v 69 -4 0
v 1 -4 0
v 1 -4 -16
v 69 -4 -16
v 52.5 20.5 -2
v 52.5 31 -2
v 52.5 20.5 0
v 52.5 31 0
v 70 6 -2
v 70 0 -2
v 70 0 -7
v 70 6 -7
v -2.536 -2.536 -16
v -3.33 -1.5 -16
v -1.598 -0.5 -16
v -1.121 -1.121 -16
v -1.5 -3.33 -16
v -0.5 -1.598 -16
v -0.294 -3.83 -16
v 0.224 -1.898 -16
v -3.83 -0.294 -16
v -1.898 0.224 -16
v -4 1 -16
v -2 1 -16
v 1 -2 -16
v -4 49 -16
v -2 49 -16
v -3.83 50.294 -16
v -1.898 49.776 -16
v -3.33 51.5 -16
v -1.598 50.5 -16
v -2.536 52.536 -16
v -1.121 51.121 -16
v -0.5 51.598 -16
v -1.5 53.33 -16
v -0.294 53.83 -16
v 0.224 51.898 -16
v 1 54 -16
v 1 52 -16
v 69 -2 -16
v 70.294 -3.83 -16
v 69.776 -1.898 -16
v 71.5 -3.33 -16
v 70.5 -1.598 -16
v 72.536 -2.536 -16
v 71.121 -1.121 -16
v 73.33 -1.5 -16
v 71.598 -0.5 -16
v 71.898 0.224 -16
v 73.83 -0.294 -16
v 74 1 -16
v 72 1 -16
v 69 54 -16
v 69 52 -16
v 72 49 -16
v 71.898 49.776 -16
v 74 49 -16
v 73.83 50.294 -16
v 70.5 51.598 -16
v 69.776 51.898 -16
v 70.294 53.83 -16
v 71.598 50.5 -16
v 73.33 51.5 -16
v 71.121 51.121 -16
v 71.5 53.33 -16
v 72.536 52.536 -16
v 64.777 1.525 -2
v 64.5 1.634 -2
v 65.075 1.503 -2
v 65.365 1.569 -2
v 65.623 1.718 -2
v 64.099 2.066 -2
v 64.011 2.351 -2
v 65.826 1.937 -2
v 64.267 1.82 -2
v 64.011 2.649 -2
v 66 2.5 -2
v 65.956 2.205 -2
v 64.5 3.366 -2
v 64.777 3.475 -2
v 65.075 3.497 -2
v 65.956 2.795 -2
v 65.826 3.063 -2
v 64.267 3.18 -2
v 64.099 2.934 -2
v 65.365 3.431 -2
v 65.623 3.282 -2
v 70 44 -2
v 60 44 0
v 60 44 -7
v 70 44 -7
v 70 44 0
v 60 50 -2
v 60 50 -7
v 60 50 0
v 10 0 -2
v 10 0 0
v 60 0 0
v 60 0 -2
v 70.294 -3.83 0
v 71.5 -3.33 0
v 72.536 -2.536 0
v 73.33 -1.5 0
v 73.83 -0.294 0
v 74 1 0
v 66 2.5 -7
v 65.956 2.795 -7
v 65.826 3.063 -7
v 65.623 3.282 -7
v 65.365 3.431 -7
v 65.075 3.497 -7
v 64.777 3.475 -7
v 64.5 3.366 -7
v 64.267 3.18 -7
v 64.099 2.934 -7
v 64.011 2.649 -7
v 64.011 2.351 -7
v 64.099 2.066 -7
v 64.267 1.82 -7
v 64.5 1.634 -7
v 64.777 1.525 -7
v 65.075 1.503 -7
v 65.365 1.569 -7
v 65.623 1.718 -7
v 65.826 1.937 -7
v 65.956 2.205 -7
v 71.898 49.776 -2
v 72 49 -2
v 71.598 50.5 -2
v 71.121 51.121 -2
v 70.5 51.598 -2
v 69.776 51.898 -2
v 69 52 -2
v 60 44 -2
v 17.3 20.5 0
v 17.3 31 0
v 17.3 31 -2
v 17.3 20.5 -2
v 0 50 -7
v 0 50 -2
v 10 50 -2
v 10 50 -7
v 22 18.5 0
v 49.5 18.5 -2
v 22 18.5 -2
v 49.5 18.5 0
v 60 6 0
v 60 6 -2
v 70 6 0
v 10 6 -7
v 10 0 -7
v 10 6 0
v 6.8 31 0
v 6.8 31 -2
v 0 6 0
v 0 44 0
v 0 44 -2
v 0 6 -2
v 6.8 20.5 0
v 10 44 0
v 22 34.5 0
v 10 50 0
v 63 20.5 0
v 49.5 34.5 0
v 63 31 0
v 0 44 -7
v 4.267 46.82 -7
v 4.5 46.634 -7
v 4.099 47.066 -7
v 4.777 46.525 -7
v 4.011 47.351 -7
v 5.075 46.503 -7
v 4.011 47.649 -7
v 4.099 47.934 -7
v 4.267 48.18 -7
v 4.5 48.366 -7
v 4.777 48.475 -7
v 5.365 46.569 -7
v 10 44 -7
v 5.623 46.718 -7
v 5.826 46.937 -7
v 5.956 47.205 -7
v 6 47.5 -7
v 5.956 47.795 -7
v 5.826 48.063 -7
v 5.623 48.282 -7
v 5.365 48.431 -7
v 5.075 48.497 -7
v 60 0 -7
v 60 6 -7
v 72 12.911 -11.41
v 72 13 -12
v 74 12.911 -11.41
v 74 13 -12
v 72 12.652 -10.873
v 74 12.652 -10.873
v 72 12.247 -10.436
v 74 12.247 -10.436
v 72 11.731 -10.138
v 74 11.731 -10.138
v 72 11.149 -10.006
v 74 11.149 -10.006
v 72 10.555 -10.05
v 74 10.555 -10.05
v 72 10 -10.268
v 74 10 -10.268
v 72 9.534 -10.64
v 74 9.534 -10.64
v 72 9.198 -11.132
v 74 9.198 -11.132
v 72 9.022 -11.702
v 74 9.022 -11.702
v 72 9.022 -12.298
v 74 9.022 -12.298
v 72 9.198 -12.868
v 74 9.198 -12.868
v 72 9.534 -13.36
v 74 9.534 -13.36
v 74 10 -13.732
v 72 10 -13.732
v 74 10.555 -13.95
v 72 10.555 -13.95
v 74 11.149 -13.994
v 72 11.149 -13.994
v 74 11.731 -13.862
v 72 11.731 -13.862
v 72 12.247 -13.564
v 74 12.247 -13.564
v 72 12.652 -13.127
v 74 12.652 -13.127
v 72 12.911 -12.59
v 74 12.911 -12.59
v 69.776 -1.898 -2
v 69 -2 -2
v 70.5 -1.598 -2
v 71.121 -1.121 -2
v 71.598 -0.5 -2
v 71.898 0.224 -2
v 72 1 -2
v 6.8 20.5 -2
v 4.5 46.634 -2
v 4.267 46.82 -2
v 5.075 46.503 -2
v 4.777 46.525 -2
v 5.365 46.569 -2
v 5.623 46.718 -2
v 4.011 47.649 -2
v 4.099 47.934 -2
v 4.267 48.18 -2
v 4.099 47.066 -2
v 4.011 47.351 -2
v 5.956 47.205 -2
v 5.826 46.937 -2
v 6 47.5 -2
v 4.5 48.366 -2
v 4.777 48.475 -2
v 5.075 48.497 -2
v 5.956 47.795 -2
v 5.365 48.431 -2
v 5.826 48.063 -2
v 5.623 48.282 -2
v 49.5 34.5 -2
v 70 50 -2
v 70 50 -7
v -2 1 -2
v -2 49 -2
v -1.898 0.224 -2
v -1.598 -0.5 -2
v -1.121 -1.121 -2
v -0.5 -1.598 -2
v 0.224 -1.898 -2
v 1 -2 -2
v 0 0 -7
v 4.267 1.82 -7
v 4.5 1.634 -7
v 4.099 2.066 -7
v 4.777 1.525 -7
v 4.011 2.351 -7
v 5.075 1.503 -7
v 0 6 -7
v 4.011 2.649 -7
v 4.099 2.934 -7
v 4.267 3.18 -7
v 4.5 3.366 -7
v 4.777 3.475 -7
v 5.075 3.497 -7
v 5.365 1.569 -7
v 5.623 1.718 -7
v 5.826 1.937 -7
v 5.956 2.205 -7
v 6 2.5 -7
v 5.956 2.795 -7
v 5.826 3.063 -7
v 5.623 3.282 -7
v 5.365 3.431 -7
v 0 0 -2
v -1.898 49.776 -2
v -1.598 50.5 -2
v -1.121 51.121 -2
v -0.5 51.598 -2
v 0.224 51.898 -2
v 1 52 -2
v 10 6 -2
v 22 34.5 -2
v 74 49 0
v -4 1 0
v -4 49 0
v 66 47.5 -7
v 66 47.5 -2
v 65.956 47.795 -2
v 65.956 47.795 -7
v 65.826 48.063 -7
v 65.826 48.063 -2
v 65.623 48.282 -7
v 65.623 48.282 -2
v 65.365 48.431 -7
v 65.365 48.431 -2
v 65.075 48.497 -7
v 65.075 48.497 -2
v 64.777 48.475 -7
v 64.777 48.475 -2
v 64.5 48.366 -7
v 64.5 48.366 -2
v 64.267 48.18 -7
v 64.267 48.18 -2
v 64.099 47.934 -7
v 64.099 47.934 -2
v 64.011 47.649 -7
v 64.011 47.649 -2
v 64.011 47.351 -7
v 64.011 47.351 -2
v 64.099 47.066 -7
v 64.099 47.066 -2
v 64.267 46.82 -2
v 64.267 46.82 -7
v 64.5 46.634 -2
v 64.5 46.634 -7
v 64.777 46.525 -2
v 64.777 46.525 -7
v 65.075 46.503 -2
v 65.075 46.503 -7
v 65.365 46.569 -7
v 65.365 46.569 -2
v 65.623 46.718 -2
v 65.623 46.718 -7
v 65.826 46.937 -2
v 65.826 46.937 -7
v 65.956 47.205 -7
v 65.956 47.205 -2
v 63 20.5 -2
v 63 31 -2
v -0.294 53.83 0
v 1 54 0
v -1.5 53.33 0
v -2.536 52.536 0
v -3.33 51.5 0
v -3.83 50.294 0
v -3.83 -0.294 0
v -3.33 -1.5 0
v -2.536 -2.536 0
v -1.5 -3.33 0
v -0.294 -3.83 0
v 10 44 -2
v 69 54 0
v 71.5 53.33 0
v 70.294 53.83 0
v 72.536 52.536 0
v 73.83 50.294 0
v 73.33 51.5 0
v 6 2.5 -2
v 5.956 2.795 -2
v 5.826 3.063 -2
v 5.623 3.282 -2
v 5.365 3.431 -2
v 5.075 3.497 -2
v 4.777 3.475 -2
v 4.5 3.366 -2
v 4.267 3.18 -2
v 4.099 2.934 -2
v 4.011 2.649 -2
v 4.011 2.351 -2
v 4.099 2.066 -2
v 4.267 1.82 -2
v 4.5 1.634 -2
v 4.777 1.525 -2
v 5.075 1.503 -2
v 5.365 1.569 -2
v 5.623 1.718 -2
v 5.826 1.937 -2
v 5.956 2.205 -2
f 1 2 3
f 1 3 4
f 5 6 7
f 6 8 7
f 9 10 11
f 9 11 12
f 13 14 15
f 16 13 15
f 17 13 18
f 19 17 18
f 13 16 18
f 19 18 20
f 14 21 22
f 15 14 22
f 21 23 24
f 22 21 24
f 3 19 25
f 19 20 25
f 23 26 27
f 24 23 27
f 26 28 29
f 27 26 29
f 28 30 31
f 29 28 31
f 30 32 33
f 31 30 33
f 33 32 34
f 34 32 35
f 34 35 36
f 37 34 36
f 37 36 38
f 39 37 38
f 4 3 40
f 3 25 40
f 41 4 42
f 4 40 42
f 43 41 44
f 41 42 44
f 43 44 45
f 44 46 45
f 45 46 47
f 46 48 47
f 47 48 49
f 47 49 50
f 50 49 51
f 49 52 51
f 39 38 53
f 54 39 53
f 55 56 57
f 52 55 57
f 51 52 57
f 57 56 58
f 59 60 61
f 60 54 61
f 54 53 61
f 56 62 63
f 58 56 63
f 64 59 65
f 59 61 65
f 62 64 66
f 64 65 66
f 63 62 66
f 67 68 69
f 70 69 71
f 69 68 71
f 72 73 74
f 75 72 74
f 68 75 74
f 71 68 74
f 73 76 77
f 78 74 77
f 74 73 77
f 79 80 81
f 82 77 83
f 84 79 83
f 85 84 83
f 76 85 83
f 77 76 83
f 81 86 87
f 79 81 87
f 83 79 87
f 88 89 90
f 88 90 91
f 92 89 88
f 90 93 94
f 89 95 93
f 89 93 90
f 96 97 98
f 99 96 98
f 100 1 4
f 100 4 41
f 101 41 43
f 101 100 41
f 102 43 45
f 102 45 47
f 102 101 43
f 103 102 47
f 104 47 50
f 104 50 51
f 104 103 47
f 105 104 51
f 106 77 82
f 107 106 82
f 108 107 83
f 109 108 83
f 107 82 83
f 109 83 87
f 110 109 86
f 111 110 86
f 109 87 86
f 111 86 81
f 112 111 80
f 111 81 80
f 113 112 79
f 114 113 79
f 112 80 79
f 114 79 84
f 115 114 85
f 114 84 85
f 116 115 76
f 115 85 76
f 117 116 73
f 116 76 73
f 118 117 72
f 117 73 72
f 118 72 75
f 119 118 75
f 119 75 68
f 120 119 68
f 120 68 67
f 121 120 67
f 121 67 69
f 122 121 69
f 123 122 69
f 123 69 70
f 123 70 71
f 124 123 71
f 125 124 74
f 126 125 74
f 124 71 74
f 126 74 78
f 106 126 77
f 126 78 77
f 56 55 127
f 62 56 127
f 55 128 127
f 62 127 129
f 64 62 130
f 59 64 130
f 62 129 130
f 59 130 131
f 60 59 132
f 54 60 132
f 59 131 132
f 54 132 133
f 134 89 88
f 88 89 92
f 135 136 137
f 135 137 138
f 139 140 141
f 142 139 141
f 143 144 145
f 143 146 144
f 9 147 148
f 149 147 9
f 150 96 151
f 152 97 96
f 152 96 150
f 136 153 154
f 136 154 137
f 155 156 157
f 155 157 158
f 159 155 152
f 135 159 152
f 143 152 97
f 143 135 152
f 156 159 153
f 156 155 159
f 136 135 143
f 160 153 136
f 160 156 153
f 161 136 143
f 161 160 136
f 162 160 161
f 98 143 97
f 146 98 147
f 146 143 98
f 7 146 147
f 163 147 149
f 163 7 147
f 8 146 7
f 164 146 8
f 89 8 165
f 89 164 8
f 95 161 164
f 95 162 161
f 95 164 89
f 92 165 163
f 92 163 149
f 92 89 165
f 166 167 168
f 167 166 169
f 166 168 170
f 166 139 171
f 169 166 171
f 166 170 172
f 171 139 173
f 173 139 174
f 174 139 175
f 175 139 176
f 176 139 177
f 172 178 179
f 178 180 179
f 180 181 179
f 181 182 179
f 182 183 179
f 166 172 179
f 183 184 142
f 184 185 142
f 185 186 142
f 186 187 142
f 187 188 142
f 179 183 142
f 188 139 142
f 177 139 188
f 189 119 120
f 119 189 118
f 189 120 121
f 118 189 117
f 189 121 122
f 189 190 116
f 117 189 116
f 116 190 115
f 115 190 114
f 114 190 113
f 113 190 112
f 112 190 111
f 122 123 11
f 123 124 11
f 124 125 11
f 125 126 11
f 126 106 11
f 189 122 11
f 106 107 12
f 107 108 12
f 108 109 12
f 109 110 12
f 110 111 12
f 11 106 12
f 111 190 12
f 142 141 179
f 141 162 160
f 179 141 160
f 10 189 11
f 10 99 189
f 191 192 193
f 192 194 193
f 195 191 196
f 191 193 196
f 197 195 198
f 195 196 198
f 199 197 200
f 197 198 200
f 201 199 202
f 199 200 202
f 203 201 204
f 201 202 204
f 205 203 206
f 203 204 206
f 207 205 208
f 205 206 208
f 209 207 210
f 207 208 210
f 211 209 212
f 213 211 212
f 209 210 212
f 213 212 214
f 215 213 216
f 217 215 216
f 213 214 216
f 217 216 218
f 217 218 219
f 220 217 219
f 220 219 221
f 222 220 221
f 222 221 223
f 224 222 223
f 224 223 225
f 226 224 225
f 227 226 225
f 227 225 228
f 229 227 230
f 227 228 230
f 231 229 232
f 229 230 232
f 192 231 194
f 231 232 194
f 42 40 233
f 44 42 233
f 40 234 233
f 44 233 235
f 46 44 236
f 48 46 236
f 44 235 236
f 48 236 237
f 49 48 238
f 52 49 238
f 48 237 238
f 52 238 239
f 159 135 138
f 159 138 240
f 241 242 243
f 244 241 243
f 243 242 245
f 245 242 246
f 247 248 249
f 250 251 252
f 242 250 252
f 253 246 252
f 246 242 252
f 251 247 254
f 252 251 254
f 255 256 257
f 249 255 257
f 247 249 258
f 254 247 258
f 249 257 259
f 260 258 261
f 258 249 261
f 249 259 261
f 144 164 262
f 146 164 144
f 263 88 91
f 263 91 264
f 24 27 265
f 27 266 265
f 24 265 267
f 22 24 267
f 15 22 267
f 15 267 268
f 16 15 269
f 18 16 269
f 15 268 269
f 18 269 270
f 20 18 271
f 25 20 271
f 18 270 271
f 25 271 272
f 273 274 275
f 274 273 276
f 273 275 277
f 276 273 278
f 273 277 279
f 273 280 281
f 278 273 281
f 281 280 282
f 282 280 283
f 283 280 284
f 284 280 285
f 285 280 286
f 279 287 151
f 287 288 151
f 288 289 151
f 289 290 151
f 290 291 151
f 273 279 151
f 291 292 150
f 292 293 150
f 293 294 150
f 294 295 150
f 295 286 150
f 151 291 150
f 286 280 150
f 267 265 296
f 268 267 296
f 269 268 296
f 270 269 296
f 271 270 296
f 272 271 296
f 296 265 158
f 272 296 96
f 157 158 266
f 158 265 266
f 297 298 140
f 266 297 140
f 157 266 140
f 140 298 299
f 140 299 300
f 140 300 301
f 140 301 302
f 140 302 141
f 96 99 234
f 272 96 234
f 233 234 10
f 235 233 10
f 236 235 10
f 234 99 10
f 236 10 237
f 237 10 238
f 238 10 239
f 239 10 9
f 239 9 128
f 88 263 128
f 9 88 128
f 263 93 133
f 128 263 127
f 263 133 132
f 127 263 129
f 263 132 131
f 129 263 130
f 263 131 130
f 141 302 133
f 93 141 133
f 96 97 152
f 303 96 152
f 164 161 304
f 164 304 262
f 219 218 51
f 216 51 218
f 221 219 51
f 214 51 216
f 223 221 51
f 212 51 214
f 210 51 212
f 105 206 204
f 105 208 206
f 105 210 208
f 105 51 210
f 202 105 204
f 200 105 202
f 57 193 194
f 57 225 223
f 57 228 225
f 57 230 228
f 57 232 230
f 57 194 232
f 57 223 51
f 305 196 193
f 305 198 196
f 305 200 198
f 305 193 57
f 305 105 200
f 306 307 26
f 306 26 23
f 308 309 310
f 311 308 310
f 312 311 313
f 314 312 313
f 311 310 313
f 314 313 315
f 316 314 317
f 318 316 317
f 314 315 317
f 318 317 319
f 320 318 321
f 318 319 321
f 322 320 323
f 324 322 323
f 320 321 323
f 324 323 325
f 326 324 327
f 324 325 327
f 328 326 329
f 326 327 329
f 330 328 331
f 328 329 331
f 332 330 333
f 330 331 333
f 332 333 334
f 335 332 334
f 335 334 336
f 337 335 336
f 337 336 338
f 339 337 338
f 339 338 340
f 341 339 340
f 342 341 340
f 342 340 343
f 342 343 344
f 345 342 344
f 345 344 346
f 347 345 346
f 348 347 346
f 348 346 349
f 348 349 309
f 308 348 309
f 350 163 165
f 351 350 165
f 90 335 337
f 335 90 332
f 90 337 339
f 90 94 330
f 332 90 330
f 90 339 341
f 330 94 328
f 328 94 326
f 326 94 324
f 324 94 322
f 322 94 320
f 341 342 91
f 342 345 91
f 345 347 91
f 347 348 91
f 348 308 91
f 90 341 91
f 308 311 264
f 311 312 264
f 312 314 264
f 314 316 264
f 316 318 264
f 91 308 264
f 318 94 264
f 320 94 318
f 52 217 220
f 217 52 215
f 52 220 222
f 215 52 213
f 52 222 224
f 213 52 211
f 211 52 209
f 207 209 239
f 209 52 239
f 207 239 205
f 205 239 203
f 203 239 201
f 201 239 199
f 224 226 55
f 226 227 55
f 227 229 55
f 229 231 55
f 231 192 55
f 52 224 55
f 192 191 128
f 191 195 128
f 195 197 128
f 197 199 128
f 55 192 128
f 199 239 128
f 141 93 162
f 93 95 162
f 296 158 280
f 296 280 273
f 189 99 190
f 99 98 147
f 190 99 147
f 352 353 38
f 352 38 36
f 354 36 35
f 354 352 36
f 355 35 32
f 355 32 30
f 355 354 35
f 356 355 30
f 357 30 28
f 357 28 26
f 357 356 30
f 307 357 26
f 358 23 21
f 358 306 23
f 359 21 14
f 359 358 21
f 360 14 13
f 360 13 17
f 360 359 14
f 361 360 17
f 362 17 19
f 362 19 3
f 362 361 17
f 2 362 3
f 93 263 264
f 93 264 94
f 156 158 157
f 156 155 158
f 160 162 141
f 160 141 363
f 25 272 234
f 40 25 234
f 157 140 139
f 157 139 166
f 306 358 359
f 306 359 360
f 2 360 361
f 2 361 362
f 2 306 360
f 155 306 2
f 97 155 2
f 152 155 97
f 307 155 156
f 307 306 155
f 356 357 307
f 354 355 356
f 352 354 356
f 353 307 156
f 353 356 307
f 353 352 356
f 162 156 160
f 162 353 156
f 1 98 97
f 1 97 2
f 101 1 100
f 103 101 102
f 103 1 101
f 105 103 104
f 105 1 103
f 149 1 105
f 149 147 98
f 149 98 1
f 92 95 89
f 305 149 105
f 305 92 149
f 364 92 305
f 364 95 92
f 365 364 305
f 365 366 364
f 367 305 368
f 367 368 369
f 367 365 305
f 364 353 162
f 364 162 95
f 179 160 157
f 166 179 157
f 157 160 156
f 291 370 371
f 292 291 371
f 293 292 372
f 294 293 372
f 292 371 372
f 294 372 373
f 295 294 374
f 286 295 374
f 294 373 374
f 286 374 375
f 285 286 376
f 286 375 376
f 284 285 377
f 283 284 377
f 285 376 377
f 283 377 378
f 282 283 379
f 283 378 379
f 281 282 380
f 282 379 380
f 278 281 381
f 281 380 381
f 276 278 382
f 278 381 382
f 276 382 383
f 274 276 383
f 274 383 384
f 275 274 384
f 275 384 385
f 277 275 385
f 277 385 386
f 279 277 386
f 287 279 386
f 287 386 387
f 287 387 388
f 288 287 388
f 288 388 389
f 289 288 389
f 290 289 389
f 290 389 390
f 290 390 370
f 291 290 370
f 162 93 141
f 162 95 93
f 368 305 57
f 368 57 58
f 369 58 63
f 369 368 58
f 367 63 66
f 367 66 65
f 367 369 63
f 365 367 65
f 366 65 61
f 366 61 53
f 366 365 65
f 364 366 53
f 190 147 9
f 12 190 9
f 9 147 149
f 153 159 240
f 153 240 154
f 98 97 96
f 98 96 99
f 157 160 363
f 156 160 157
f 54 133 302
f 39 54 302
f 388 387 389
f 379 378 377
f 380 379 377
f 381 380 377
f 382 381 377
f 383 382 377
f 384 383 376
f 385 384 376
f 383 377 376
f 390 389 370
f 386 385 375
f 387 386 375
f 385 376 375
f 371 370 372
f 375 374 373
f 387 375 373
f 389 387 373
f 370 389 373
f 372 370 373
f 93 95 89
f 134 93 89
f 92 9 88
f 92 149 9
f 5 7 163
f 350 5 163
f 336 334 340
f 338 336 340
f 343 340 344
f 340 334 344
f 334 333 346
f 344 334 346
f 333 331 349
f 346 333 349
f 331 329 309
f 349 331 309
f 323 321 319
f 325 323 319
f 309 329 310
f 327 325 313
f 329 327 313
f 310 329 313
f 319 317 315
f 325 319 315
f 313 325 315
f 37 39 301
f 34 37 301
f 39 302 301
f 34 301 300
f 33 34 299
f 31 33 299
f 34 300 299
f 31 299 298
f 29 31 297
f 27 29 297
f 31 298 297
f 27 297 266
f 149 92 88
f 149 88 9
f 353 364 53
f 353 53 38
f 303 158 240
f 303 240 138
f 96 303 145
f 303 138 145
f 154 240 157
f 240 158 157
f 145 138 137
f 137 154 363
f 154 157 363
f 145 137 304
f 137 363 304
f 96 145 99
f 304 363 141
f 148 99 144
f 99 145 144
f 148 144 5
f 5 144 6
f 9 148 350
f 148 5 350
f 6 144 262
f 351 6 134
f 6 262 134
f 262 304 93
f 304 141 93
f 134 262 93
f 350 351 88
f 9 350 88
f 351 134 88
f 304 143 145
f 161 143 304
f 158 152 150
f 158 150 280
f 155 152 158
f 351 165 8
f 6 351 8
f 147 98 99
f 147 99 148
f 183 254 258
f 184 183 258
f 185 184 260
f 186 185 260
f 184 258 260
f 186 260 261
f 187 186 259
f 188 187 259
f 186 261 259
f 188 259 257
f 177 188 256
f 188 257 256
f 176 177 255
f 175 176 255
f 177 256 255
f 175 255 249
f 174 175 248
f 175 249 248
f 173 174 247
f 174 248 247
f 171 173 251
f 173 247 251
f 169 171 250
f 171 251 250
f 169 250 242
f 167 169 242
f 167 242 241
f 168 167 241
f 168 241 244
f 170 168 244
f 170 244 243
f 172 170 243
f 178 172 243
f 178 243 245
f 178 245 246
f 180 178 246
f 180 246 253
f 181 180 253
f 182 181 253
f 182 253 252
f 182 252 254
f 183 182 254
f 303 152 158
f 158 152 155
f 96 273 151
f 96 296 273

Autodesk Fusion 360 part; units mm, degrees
sketch "Sketch1" plane through (0, 0, 0) normal (0, 0, 1) x (1, 0, 0)
  line L0 (1, 0) -> (69, 0)
  line L1 (70, 1) -> (70, 49)
  line L2 (69, 50) -> (1, 50)
  line L3 (0, 49) -> (0, 1)
  line L4 (0, 2.5) -> (70, 2.5) construction
  line L5 (0, 47.5) -> (70, 47.5) construction
  line L6 (65, 50) -> (65, 0) construction
  line L7 (5, 50) -> (5, 0) construction
  line L8 (0, 50) -> (10, 50)
  line L9 (10, 50) -> (10, 44)
  line L10 (10, 44) -> (0, 44)
  line L11 (0, 44) -> (0, 50)
  line L12 (70, 50) -> (60, 50)
  line L13 (60, 50) -> (60, 44)
  line L14 (60, 44) -> (70, 44)
  line L15 (70, 44) -> (70, 50)
  line L16 (0, 0) -> (10, 0)
  line L17 (10, 0) -> (10, 6)
  line L18 (10, 6) -> (0, 6)
  line L19 (0, 6) -> (0, 0)
  line L20 (70, 0) -> (60, 0)
  line L21 (60, 0) -> (60, 6)
  line L22 (60, 6) -> (70, 6)
  line L23 (70, 6) -> (70, 0)
  line L24 (6.8, 50) -> (6.8, 0) construction
  line L25 (63, 0) -> (63, 50) construction
  line L26 (63, 31) -> (52.5, 31)
  line L27 (52.5, 31) -> (52.5, 20.5)
  line L28 (52.5, 20.5) -> (63, 20.5)
  line L29 (63, 20.5) -> (63, 31)
  line L30 (6.8, 31) -> (17.3, 31)
  line L31 (17.3, 31) -> (17.3, 20.5)
  line L32 (17.3, 20.5) -> (6.8, 20.5)
  line L33 (6.8, 20.5) -> (6.8, 31)
  line L34 (22, 34.5) -> (49.5, 34.5)
  line L35 (49.5, 34.5) -> (49.5, 18.5)
  line L36 (49.5, 18.5) -> (22, 18.5)
  line L37 (22, 18.5) -> (22, 34.5)
  circle A0 centre (5, 47.5) radius 1
  circle A1 centre (65, 47.5) radius 1
  circle A2 centre (5, 2.5) radius 1
  circle A3 centre (65, 2.5) radius 1
  arc A4 (1, 50) -> (0, 49) centre (1, 49) ccw
  arc A5 (70, 49) -> (69, 50) centre (69, 49) ccw
  arc A6 (0, 1) -> (1, 0) centre (1, 1) ccw
  arc A7 (69, 0) -> (70, 1) centre (69, 1) ccw
  line L38 (72, 1) -> (72, 49)
  arc A8 (72, 49) -> (69, 52) centre (69, 49) ccw
  line L39 (69, 52) -> (1, 52)
  arc A9 (1, 52) -> (-2, 49) centre (1, 49) ccw
  line L40 (-2, 49) -> (-2, 1)
  arc A10 (-2, 1) -> (1, -2) centre (1, 1) ccw
  line L41 (1, -2) -> (69, -2)
  arc A11 (69, -2) -> (72, 1) centre (69, 1) ccw
  line L42 (1, -4) -> (69, -4)
  arc A12 (69, -4) -> (74, 1) centre (69, 1) ccw
  line L43 (74, 1) -> (74, 49)
  arc A13 (74, 49) -> (69, 54) centre (69, 49) ccw
  line L44 (69, 54) -> (1, 54)
  arc A14 (1, 54) -> (-4, 49) centre (1, 49) ccw
  line L45 (-4, 49) -> (-4, 1)
  arc A15 (-4, 1) -> (1, -4) centre (1, 1) ccw
  dimension "d1" = 2
  dimension "d2" = 4
  dimension "d3" = 5
  dimension "d4" = 5
  dimension "d5" = 2.5
  dimension "d6" = 2.5
  dimension "d7" = 10
  dimension "d8" = 6
  dimension "d9" = 10
  dimension "d10" = 6
  dimension "d11" = 10
  dimension "d12" = 6
  dimension "d13" = 10
  dimension "d14" = 6
  dimension "d15" = 6.8
  dimension "d16" = 7
  dimension "d17" = 10.5
  dimension "d18" = 10.5
  dimension "d19" = 10.5
  dimension "d20" = 10.5
  dimension "d21" = 19
  dimension "d22" = 19
  dimension "d23" = 27.5
  dimension "d24" = 16
  dimension "d25" = 22
  dimension "d34" = 2
  dimension "d35" = 2
  dimension "d36" = 2
  dimension "d37" = 2
  dimension "d41" = 1
  dimension "d42" = 1
  dimension "d43" = 1
  dimension "d44" = 1
  dimension "d45" = 15.5
extrude "Extrude1" add sketch "Sketch1" against normal blind 16 contours L42 A12 L43 A13 L44 A14 L45 A15 makes body 1
extrude "Extrude2" add sketch "Sketch1" against normal blind 2 contours L38 A8 L39 A9 L40 A10 L41 A11 bodies 1
extrude "Extrude3" add sketch "Sketch1" against normal blind 7 contours L0 L3 L16 L17 L18 L19 A6 | L16 L19 A6 | L0 L1 L20 L21 L22 L23 A7 | L20 L23 A7 | L2 L3 L8 L9 L10 L11 A4 | L8 L11 A4 | L1 L2 L12 L13 L14 L15 A5 | L12 L15 A5 | A0 | A1 | A2 | A3 bodies 1
extrude "Extrude4" add sketch "Sketch1" against normal blind 2 separate body contours L0 L1 L2 L3 L9 L10 L13 L14 L17 L18 L21 L22 makes body 2
extrude "Extrude5" cut sketch "Sketch1" against normal blind 12 from surface at -2 contours A0 | A1 | A2 | A3 bodies 1
sketch "Sketch2" plane through (74, 0, 0) normal (1, 0, 0) x (0, 1, 0)
  line L0 (49, 0) -> (1, 0)
  line L1 (1, 0) -> (1, -16)
  line L2 (1, -16) -> (49, -16)
  line L3 (49, -16) -> (49, 0)
  line L4 (11, 0) -> (11, -16) construction
  line L5 (1, -12) -> (49, -12) construction
  circle A0 centre (11, -12) radius 2
  dimension "d47" = 4
  dimension "d50" = 10
  dimension "d51" = 4
extrude "Extrude7" cut sketch "Sketch2" against normal blind 6 contours A0 bodies 1
